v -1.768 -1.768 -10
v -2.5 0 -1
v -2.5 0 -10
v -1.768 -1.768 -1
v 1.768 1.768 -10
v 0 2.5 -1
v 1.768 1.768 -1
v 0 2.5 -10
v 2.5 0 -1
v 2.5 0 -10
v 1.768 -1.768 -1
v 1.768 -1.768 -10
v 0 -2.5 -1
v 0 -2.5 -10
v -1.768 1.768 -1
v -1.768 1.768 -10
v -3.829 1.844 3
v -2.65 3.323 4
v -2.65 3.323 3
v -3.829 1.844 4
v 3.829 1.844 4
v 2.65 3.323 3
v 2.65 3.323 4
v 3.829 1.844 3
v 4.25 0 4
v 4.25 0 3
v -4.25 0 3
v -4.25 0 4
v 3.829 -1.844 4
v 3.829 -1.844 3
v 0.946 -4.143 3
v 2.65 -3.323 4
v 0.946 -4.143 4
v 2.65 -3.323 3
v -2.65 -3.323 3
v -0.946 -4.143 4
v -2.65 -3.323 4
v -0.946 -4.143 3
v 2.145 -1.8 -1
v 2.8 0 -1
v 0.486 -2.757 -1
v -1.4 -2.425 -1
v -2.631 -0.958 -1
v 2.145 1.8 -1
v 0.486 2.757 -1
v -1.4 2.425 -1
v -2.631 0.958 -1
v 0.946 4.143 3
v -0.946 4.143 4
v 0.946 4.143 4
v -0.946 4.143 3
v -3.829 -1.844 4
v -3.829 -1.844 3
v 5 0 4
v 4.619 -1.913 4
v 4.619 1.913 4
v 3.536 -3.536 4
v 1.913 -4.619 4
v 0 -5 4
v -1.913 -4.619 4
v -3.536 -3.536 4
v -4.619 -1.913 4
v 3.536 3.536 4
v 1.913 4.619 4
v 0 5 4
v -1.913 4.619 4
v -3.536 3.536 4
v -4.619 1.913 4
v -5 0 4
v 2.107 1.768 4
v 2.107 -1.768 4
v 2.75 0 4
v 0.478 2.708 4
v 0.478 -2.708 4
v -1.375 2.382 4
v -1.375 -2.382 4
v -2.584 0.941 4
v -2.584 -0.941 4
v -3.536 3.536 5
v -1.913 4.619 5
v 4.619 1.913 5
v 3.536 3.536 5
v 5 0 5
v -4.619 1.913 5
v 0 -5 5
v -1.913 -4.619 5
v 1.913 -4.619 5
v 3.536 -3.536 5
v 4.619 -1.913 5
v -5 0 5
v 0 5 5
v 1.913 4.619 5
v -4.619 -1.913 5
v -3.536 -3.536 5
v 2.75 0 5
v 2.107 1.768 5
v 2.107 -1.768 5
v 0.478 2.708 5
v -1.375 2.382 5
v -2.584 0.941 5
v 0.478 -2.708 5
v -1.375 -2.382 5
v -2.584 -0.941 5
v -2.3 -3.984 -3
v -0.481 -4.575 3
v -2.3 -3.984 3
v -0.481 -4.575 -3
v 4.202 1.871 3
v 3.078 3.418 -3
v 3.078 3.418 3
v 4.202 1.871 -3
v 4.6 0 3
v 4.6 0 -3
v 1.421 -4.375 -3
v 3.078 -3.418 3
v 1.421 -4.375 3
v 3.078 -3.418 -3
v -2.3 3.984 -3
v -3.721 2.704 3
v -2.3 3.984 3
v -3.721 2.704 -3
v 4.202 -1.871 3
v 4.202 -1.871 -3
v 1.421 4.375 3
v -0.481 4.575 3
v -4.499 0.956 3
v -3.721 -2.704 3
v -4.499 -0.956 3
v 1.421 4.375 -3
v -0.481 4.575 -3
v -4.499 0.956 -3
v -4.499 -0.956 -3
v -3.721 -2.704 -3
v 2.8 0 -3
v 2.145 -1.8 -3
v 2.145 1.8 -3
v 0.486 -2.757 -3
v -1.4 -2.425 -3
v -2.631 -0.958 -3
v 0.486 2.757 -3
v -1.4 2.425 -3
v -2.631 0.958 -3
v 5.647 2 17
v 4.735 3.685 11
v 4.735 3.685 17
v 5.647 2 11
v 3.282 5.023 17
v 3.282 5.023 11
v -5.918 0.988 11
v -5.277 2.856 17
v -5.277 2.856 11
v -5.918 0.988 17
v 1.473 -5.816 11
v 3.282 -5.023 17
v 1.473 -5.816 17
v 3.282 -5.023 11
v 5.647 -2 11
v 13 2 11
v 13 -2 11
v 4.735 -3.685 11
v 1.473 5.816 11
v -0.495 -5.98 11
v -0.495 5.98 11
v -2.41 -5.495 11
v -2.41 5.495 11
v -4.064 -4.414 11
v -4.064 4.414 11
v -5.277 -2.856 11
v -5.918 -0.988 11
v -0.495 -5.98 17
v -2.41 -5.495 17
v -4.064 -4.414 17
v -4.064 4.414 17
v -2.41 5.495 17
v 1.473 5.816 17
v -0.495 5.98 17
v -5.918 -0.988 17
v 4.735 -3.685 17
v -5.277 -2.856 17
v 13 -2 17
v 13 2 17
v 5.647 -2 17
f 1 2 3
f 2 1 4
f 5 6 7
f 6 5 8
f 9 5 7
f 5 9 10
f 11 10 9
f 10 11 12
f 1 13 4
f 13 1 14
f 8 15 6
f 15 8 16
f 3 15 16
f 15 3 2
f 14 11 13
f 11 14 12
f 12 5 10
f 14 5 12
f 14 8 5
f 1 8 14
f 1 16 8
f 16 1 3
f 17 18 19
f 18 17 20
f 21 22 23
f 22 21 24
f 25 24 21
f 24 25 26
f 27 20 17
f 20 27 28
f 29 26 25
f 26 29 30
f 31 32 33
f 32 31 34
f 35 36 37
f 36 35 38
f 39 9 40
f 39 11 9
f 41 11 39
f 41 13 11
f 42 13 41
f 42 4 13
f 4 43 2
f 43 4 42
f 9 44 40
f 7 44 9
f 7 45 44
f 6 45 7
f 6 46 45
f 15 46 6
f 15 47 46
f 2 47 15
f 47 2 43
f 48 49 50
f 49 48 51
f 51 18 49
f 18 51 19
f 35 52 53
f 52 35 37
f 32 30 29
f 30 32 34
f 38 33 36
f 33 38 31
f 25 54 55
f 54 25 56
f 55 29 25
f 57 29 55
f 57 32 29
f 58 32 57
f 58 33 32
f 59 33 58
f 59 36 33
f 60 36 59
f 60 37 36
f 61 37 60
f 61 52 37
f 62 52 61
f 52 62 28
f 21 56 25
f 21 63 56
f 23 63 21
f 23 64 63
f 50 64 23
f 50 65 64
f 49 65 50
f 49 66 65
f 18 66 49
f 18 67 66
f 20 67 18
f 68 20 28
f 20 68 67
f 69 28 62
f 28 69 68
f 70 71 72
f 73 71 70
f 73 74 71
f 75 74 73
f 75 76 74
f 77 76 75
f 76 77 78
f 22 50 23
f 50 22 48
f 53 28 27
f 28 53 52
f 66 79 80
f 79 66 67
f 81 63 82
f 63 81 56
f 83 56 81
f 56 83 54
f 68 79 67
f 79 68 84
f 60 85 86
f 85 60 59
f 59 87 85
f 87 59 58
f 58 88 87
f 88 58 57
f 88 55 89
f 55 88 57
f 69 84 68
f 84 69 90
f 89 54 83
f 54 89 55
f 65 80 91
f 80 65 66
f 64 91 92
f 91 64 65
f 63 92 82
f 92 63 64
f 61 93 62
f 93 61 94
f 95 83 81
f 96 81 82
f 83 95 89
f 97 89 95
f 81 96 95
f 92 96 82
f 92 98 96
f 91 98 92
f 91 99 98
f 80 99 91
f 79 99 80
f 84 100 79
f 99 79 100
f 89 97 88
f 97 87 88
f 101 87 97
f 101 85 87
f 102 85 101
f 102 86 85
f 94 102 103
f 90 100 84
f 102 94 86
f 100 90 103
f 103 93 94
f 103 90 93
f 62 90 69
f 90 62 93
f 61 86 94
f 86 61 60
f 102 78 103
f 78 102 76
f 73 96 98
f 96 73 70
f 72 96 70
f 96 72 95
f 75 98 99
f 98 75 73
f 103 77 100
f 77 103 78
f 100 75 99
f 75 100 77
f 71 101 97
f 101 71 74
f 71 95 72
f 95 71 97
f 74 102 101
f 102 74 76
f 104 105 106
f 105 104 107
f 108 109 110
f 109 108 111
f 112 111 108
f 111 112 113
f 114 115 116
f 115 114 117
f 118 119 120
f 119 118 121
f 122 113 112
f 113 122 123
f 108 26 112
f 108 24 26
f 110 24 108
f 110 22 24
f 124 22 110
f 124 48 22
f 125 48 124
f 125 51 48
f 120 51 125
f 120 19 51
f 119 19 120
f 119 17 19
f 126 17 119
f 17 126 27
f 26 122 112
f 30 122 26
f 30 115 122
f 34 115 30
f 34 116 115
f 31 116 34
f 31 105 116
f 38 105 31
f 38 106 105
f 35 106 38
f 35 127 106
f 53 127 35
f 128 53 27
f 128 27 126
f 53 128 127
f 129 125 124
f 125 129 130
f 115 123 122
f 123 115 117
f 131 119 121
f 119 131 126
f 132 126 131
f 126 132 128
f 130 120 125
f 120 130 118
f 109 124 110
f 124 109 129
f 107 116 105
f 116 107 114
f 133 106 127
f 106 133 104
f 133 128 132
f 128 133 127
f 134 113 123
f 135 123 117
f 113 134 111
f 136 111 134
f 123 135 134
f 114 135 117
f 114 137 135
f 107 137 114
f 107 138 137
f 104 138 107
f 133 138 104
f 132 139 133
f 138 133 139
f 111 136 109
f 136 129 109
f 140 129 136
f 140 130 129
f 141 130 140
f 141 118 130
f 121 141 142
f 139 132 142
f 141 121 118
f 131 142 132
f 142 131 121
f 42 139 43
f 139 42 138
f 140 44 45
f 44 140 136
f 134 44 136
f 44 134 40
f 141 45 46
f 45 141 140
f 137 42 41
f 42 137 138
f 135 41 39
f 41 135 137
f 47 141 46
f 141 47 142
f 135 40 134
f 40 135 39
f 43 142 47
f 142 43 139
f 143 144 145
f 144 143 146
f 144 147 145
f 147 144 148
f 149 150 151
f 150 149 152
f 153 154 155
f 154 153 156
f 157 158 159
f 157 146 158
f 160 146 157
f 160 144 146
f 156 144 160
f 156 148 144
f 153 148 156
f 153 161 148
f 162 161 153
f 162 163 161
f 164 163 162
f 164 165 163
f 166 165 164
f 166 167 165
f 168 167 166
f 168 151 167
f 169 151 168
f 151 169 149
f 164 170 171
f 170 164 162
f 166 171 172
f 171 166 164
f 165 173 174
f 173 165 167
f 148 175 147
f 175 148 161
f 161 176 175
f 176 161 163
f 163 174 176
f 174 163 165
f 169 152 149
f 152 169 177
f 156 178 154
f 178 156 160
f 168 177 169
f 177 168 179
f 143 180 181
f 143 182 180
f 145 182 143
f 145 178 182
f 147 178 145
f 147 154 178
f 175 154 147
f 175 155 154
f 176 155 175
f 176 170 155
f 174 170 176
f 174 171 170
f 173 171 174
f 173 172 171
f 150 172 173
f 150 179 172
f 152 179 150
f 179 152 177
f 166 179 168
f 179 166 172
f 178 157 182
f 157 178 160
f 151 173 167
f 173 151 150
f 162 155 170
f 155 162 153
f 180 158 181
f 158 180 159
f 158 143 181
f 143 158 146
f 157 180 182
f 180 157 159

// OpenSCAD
// Parameters
shaft_diameter_mm = 5; //[2.5:10:0.1]
overall_length_mm = 10; //[5:20:0.5]
head_diameter_mm = 8.5; //[4.25:17:0.1]
head_height_mm = 5; //[2.5:10:0.1]
socket_af_mm = 4; //[2:8:0.1]
socket_depth_mm = 3; //[1.5:6:0.1]
thread_minor_diameter_mm = 4.2; //[2.1:8.4:0.1]
unthreaded_length_mm = 2; //[0:6:0.5]
runout_length_mm = 1; //[0.5:3:0.1]
head_shank_chamfer_height_mm = 0.8; //[0.3:2:0.1]
overlap_mm = 1; //[0.5:2:0.1]
washer_outer_diameter_mm = 10; //[5:20:0.5]
washer_thickness_mm = 1; //[0.5:3:0.1]
washer_hole_diameter_mm = 5.5; //[3:11:0.1]
pcb_spacer_height_mm = 6; //[3:12:0.5]
pcb_spacer_wall_mm = 1.8; //[0.9:3.6:0.1]
pcb_spacer_clearance_diameter_mm = 5.6; //[3:11:0.1]
buzzer_diameter_mm = 12; //[6:24:0.5]
buzzer_height_mm = 6; //[3:12:0.5]
pin_socket_width_mm = 8; //[4:16:0.5]
pin_socket_depth_mm = 4; //[2:8:0.5]
pin_socket_height_mm = 6; //[3:12:0.5]

// PCB Spacer - complete geometry
module pcb_spacer() {
  color([0.85, 0.85, 0.8]) {
    difference() {
      cylinder(r=pcb_spacer_clearance_diameter_mm/2 + pcb_spacer_wall_mm, h=pcb_spacer_height_mm, center=true);
      translate([0, 0, -overlap_mm])
        cylinder(r=pcb_spacer_clearance_diameter_mm/2, h=pcb_spacer_height_mm + 2*overlap_mm, center=true);
    }
  }
}

// Screw and Washer - complete geometry
module screw_and_washer() {
  color("DimGray") {
    union() {
      // Threaded shaft
      translate([0, 0, -overall_length_mm/2])
        cylinder(r=shaft_diameter_mm/2, h=overall_length_mm, center=true);
      // Unthreaded shank
      translate([0, 0, -unthreaded_length_mm/2])
        cylinder(r=shaft_diameter_mm/2, h=unthreaded_length_mm, center=true);
      // Runout cone
      translate([0, 0, -unthreaded_length_mm - runout_length_mm/2])
        cylinder(r1=shaft_diameter_mm/2, r2=thread_minor_diameter_mm/2, h=runout_length_mm, center=true);
      // Socket cap head
      translate([0, 0, head_height_mm/2 - overlap_mm])
        cylinder(r=head_diameter_mm/2, h=head_height_mm, center=true);
      // Head to shank chamfer
      translate([0, 0, head_shank_chamfer_height_mm/2 - overlap_mm])
        cylinder(r1=head_diameter_mm/2, r2=shaft_diameter_mm/2, h=head_shank_chamfer_height_mm, center=true);
      // Hex socket recess
      translate([0, 0, head_height_mm - socket_depth_mm/2 - overlap_mm])
        cylinder(r=socket_af_mm/(2*cos(30)), h=socket_depth_mm, center=true);
    }
  }
  // Washer
  color("Silver") {
    difference() {
      translate([0, 0, head_height_mm + washer_thickness_mm/2 - overlap_mm])
        cylinder(r=washer_outer_diameter_mm/2, h=washer_thickness_mm, center=true);
      translate([0, 0, head_height_mm + washer_thickness_mm/2 - overlap_mm])
        cylinder(r=washer_hole_diameter_mm/2, h=washer_thickness_mm + 2*overlap_mm, center=true);
    }
  }
}

// Buzzer - complete geometry
module buzzer() {
  color([0.1, 0.1, 0.6]) {
    translate([0, 0, head_height_mm + washer_thickness_mm + pcb_spacer_height_mm + buzzer_height_mm/2 - overlap_mm])
      cylinder(r=buzzer_diameter_mm/2, h=buzzer_height_mm, center=true);
  }
}

// Pin Socket - complete geometry
module pin_socket() {
  color([0.2, 0.2, 0.2]) {
    translate([buzzer_diameter_mm/2 + pin_socket_width_mm/2 - overlap_mm, 0, head_height_mm + washer_thickness_mm + pcb_spacer_height_mm + buzzer_height_mm - pin_socket_height_mm/2 - overlap_mm])
      cube([pin_socket_width_mm, pin_socket_depth_mm, pin_socket_height_mm], center=true);
  }
}

// Assembly
module assembly() {
  screw_and_washer();
  pcb_spacer();
  buzzer();
  pin_socket();
}

assembly();
